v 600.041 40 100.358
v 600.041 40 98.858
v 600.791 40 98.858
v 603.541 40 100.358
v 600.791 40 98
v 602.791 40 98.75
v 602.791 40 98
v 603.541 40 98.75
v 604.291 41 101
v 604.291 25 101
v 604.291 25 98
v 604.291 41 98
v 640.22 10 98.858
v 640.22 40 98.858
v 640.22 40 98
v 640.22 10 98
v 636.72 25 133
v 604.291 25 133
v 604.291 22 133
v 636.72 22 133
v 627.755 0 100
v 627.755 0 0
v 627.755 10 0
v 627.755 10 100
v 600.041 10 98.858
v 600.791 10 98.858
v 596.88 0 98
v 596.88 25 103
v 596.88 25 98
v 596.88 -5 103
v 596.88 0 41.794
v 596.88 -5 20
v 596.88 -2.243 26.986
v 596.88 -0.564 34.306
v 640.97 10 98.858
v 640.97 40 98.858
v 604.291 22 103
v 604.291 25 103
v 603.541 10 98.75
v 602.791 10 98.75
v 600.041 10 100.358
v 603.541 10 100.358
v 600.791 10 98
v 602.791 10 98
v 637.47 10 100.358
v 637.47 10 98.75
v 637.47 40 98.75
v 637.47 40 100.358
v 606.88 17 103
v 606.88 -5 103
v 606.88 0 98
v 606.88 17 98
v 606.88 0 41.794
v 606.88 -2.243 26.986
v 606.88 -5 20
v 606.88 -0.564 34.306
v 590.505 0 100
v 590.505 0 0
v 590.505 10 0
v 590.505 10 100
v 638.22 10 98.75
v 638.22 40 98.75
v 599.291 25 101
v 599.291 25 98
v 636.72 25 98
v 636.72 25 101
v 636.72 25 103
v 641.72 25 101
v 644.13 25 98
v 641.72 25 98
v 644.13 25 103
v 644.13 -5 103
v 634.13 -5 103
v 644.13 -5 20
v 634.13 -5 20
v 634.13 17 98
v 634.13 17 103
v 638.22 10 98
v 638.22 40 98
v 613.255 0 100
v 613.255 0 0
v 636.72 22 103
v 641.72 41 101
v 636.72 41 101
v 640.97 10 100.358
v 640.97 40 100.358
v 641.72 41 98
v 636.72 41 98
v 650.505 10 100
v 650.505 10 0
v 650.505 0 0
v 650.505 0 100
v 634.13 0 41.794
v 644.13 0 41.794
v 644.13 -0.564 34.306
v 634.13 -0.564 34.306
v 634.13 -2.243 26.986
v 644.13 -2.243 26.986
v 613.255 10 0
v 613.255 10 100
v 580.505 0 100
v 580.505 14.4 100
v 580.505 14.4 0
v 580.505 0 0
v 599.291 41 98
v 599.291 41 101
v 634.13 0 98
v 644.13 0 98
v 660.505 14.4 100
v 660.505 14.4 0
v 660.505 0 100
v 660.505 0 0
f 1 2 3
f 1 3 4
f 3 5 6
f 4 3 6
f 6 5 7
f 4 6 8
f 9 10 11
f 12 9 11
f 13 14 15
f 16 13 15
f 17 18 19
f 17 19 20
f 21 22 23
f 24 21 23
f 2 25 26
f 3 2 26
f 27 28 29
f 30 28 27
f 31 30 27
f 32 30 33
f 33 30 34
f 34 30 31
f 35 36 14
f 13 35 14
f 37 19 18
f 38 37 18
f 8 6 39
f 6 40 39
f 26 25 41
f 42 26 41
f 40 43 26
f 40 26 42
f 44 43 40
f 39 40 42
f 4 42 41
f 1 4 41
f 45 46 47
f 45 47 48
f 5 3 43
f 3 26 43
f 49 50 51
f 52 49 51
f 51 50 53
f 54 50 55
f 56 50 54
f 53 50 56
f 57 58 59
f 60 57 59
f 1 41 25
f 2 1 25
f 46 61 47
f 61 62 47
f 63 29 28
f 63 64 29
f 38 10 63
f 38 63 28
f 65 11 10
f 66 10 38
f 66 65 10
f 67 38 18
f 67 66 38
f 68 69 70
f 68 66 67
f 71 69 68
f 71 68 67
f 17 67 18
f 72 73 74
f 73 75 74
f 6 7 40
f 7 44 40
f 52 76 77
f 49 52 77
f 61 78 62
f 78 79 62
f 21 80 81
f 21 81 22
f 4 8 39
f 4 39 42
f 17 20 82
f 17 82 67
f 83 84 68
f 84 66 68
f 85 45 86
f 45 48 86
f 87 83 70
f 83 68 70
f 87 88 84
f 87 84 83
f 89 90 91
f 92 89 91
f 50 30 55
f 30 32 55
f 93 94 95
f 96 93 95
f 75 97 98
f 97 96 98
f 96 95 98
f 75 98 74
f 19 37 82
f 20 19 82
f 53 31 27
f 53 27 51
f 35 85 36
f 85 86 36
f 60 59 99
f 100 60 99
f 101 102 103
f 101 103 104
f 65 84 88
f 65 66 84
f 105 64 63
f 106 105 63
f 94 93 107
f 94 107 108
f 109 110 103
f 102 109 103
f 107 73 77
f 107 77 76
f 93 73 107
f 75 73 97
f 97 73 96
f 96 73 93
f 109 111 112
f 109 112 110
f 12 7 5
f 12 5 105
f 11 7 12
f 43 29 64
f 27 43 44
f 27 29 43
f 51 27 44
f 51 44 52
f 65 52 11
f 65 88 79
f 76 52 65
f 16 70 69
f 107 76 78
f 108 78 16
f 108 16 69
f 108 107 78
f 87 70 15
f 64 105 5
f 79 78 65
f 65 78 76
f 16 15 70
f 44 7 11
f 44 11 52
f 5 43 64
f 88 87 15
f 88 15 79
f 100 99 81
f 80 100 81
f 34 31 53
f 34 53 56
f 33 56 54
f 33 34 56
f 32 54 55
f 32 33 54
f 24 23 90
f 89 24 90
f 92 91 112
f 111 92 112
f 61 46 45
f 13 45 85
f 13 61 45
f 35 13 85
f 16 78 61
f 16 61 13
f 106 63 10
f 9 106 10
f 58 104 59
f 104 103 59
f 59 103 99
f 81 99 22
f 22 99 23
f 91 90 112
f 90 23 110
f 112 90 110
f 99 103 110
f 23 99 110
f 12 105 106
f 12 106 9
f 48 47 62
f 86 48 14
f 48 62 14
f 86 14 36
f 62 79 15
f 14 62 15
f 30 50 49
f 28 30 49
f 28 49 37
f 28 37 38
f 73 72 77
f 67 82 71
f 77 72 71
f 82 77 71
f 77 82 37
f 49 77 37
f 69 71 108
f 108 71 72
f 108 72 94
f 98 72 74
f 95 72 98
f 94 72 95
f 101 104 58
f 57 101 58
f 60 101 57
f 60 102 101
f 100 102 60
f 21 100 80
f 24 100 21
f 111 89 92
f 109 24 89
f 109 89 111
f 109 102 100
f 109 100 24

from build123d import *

# Parameters (mm, degrees)
Y_KSEKLIK_EKSTR_ZYON1_DEPTH   = 100
IZIM3_W                       = 10
IZIM3_H                       = 80
Y_KSEKLIK_EKSTR_ZYON4_DEPTH   = 5
Y_KSEKLIK_EKSTR_ZYON4_2_DEPTH = 5
IZIM5_W                       = 10
IZIM5_H                       = 5
Y_KSEKLIK_EKSTR_ZYON5_DEPTH   = 3
IZIM7_W                       = 10
IZIM7_H                       = 5
Y_KSEKLIK_EKSTR_ZYON6_DEPTH   = 25
RADYUS3_START                 = 596.88039773
RADYUS3_DEPTH                 = 10
RADYUS4_R                     = 50
IZIM8_W                       = 5
IZIM8_H                       = 8
Y_KSEKLIK_EKSTR_ZYON8_DEPTH   = 31
KES_EKSTR_ZYON3_DEPTH         = 15
Y_KSEKLIK_EKSTR_ZYON10_DEPTH  = 15
IZIM16_W                      = 32.429128763
IZIM16_H                      = 3
Y_KSEKLIK_EKSTR_ZYON12_DEPTH  = 50
IZIM17_W                      = 5
IZIM17_H                      = 3
Y_KSEKLIK_EKSTR_ZYON13_DEPTH  = 1
IZIM18_W                      = 32.429128763
IZIM18_H                      = 20
KES_EKSTR_ZYON4_DEPTH         = 10


with BuildPart() as part:
    # Çizim1 → Yükseklik-Ekstrüzyon1 (new body)
    with BuildSketch(Plane.XY):
        Polygon((580.50539773, 0), (590.50539773, 0), (590.50539773, 10), (613.25539773, 10), (613.25539773, 0), (627.75539773, 0), (627.75539773, 10), (650.50539773, 10), (650.50539773, 0), (660.50539773, 0), (660.50539773, 14.4), (580.50539773, 14.4), align=None)
    extrude(amount=Y_KSEKLIK_EKSTR_ZYON1_DEPTH)


with BuildPart() as body_2:
    # Çizim3 → Yükseklik-Ekstrüzyon4 (new body)
    with BuildSketch(Plane(origin=(0, 0, 0), x_dir=(-1, 0, 0), z_dir=(0, -1, 0))):
        with Locations((-601.88039773, -60)):
            Rectangle(IZIM3_W, IZIM3_H)
    extrude(amount=Y_KSEKLIK_EKSTR_ZYON4_DEPTH)



with BuildPart() as body_3:
    # Çizim3 → Y_kseklik-Ekstr_zyon4 2 (new body)
    with BuildSketch(Plane(origin=(0, 0, 0), x_dir=(-1, 0, 0), z_dir=(0, -1, 0))):
        with Locations((-639.13039773, -60)):
            Rectangle(IZIM3_W, IZIM3_H)
    extrude(amount=Y_KSEKLIK_EKSTR_ZYON4_2_DEPTH)


with BuildPart() as body_2_1:
    add(body_2.part)

    add(body_3.part)  # Yükseklik-Ekstrüzyon5 merges body 3
    # Çizim5 → Yükseklik-Ekstrüzyon5 (add)
    with BuildSketch(Plane.XY.offset(100)):
        with Locations((601.88039773, -2.5)):
            Rectangle(IZIM5_W, IZIM5_H)
        with Locations((639.13039773, -2.5)):
            Rectangle(IZIM5_W, IZIM5_H)
    extrude(amount=Y_KSEKLIK_EKSTR_ZYON5_DEPTH)

    # Çizim7 → Yükseklik-Ekstrüzyon6 (add)
    with BuildSketch(Plane(origin=(0, 0, 0), x_dir=(1, 0, 0), z_dir=(0, 1, 0))):
        with Locations((601.88039773, -100.5)):
            Rectangle(IZIM7_W, IZIM7_H)
        with Locations((639.13039773, -100.5)):
            Rectangle(IZIM7_W, IZIM7_H)
    extrude(amount=Y_KSEKLIK_EKSTR_ZYON6_DEPTH)

    # Radyus3: read off the stored shape, not the designer's step
    # Radyus3 outline → Radyus3 (cut)
    with BuildSketch(Plane.YZ.offset(RADYUS3_START)):
        with BuildLine():
            ThreePointArc((0, 41.794494718), (-1.266028276, 30.61415483), (-5, 20))
            Line((-5, 20), (0, 20))
            Line((0, 20), (0, 41.794494718))
        make_face()
    extrude(amount=RADYUS3_DEPTH, mode=Mode.SUBTRACT)

    # Radyus4
    # the kernel refuses this fillet: 50 mm, written as the material it takes off along each edge
    with BuildSketch(Plane(origin=(698.616634524, 0, 20), x_dir=(0, 0, 1), z_dir=(-1, 0, 0))) as radyus4_piece_1:
        with BuildLine():
            CenterArc((21.794494718, -50), RADYUS4_R, 90, 25.841932763)
            Line((0, -5), (-0.435889894, -4.1))
            ThreePointArc((-0.435889894, -4.1), (-1, -2.5), (-1, 0))
            Line((-1, 0), (0, 1))
            Line((0, 1), (21.794494718, 1))
            Line((21.794494718, 1), (21.794494718, 0))
        make_face()
    extrude(amount=118.972473589, mode=Mode.SUBTRACT)

    # Çizim8 → Yükseklik-Ekstrüzyon8 (add)
    with BuildSketch(Plane.ZY.offset(-634.13039773)):
        with Locations((100.5, 21)):
            Rectangle(IZIM8_W, IZIM8_H)
    extrude(amount=Y_KSEKLIK_EKSTR_ZYON8_DEPTH)

    # Çizim9 → Kes-Ekstrüzyon3 (cut)
    with BuildSketch(Plane(origin=(0, 25, 0), x_dir=(1, 0, 0), z_dir=(0, 1, 0))):
        Polygon((602.790833348, -98.75), (602.790833348, -98), (600.790833348, -98), (600.790833348, -98.858486155), (600.040833348, -98.858486155), (600.040833348, -100.358486155), (603.540833348, -100.358486155), (603.540833348, -98.75), align=None)
        Polygon((640.219962111, -98), (638.219962111, -98), (638.219962111, -98.75), (637.469962111, -98.75), (637.469962111, -100.358486155), (640.969962111, -100.358486155), (640.969962111, -98.858486155), (640.219962111, -98.858486155), align=None)
    extrude(amount=-KES_EKSTR_ZYON3_DEPTH, mode=Mode.SUBTRACT)

    # Çizim15 → Yükseklik-Ekstrüzyon10 (add)
    with BuildSketch(Plane(origin=(0, 25, 0), x_dir=(1, 0, 0), z_dir=(0, 1, 0))):
        Polygon((600.040833348, -98.858486155), (600.790833348, -98.858486155), (600.790833348, -98), (599.290833348, -98), (599.290833348, -101), (604.290833348, -101), (604.290833348, -98), (602.790833348, -98), (602.790833348, -98.75), (603.540833348, -98.75), (603.540833348, -100.358486155), (600.040833348, -100.358486155), align=None)
        Polygon((638.219962111, -98), (636.719962111, -98), (636.719962111, -101), (641.719962111, -101), (641.719962111, -98), (640.219962111, -98), (640.219962111, -98.858486155), (640.969962111, -98.858486155), (640.969962111, -100.358486155), (637.469962111, -100.358486155), (637.469962111, -98.75), (638.219962111, -98.75), align=None)
    extrude(amount=Y_KSEKLIK_EKSTR_ZYON10_DEPTH)

    # Çizim16 → Yükseklik-Ekstrüzyon12 (add)
    with BuildSketch(Plane.XY.offset(103)):
        with Locations((620.50539773, 23.5)):
            Rectangle(IZIM16_W, IZIM16_H)
    extrude(amount=Y_KSEKLIK_EKSTR_ZYON12_DEPTH)

    # Çizim17 → Yükseklik-Ekstrüzyon13 (add)
    with BuildSketch(Plane(origin=(0, 40, 0), x_dir=(1, 0, 0), z_dir=(0, 1, 0))):
        with Locations((639.219962111, -99.5)):
            Rectangle(IZIM17_W, IZIM17_H)
        with Locations((601.790833348, -99.5)):
            Rectangle(IZIM17_W, IZIM17_H)
    extrude(amount=Y_KSEKLIK_EKSTR_ZYON13_DEPTH)

    # Çizim18 → Kes-Ekstrüzyon4 (cut)
    with BuildSketch(Plane(origin=(0, 25, 0), x_dir=(1, 0, 0), z_dir=(0, 1, 0))):
        with Locations((620.50539773, -143)):
            Rectangle(IZIM18_W, IZIM18_H)
    extrude(amount=-KES_EKSTR_ZYON4_DEPTH, mode=Mode.SUBTRACT)


solid = Compound([part.part, body_2_1.part])
